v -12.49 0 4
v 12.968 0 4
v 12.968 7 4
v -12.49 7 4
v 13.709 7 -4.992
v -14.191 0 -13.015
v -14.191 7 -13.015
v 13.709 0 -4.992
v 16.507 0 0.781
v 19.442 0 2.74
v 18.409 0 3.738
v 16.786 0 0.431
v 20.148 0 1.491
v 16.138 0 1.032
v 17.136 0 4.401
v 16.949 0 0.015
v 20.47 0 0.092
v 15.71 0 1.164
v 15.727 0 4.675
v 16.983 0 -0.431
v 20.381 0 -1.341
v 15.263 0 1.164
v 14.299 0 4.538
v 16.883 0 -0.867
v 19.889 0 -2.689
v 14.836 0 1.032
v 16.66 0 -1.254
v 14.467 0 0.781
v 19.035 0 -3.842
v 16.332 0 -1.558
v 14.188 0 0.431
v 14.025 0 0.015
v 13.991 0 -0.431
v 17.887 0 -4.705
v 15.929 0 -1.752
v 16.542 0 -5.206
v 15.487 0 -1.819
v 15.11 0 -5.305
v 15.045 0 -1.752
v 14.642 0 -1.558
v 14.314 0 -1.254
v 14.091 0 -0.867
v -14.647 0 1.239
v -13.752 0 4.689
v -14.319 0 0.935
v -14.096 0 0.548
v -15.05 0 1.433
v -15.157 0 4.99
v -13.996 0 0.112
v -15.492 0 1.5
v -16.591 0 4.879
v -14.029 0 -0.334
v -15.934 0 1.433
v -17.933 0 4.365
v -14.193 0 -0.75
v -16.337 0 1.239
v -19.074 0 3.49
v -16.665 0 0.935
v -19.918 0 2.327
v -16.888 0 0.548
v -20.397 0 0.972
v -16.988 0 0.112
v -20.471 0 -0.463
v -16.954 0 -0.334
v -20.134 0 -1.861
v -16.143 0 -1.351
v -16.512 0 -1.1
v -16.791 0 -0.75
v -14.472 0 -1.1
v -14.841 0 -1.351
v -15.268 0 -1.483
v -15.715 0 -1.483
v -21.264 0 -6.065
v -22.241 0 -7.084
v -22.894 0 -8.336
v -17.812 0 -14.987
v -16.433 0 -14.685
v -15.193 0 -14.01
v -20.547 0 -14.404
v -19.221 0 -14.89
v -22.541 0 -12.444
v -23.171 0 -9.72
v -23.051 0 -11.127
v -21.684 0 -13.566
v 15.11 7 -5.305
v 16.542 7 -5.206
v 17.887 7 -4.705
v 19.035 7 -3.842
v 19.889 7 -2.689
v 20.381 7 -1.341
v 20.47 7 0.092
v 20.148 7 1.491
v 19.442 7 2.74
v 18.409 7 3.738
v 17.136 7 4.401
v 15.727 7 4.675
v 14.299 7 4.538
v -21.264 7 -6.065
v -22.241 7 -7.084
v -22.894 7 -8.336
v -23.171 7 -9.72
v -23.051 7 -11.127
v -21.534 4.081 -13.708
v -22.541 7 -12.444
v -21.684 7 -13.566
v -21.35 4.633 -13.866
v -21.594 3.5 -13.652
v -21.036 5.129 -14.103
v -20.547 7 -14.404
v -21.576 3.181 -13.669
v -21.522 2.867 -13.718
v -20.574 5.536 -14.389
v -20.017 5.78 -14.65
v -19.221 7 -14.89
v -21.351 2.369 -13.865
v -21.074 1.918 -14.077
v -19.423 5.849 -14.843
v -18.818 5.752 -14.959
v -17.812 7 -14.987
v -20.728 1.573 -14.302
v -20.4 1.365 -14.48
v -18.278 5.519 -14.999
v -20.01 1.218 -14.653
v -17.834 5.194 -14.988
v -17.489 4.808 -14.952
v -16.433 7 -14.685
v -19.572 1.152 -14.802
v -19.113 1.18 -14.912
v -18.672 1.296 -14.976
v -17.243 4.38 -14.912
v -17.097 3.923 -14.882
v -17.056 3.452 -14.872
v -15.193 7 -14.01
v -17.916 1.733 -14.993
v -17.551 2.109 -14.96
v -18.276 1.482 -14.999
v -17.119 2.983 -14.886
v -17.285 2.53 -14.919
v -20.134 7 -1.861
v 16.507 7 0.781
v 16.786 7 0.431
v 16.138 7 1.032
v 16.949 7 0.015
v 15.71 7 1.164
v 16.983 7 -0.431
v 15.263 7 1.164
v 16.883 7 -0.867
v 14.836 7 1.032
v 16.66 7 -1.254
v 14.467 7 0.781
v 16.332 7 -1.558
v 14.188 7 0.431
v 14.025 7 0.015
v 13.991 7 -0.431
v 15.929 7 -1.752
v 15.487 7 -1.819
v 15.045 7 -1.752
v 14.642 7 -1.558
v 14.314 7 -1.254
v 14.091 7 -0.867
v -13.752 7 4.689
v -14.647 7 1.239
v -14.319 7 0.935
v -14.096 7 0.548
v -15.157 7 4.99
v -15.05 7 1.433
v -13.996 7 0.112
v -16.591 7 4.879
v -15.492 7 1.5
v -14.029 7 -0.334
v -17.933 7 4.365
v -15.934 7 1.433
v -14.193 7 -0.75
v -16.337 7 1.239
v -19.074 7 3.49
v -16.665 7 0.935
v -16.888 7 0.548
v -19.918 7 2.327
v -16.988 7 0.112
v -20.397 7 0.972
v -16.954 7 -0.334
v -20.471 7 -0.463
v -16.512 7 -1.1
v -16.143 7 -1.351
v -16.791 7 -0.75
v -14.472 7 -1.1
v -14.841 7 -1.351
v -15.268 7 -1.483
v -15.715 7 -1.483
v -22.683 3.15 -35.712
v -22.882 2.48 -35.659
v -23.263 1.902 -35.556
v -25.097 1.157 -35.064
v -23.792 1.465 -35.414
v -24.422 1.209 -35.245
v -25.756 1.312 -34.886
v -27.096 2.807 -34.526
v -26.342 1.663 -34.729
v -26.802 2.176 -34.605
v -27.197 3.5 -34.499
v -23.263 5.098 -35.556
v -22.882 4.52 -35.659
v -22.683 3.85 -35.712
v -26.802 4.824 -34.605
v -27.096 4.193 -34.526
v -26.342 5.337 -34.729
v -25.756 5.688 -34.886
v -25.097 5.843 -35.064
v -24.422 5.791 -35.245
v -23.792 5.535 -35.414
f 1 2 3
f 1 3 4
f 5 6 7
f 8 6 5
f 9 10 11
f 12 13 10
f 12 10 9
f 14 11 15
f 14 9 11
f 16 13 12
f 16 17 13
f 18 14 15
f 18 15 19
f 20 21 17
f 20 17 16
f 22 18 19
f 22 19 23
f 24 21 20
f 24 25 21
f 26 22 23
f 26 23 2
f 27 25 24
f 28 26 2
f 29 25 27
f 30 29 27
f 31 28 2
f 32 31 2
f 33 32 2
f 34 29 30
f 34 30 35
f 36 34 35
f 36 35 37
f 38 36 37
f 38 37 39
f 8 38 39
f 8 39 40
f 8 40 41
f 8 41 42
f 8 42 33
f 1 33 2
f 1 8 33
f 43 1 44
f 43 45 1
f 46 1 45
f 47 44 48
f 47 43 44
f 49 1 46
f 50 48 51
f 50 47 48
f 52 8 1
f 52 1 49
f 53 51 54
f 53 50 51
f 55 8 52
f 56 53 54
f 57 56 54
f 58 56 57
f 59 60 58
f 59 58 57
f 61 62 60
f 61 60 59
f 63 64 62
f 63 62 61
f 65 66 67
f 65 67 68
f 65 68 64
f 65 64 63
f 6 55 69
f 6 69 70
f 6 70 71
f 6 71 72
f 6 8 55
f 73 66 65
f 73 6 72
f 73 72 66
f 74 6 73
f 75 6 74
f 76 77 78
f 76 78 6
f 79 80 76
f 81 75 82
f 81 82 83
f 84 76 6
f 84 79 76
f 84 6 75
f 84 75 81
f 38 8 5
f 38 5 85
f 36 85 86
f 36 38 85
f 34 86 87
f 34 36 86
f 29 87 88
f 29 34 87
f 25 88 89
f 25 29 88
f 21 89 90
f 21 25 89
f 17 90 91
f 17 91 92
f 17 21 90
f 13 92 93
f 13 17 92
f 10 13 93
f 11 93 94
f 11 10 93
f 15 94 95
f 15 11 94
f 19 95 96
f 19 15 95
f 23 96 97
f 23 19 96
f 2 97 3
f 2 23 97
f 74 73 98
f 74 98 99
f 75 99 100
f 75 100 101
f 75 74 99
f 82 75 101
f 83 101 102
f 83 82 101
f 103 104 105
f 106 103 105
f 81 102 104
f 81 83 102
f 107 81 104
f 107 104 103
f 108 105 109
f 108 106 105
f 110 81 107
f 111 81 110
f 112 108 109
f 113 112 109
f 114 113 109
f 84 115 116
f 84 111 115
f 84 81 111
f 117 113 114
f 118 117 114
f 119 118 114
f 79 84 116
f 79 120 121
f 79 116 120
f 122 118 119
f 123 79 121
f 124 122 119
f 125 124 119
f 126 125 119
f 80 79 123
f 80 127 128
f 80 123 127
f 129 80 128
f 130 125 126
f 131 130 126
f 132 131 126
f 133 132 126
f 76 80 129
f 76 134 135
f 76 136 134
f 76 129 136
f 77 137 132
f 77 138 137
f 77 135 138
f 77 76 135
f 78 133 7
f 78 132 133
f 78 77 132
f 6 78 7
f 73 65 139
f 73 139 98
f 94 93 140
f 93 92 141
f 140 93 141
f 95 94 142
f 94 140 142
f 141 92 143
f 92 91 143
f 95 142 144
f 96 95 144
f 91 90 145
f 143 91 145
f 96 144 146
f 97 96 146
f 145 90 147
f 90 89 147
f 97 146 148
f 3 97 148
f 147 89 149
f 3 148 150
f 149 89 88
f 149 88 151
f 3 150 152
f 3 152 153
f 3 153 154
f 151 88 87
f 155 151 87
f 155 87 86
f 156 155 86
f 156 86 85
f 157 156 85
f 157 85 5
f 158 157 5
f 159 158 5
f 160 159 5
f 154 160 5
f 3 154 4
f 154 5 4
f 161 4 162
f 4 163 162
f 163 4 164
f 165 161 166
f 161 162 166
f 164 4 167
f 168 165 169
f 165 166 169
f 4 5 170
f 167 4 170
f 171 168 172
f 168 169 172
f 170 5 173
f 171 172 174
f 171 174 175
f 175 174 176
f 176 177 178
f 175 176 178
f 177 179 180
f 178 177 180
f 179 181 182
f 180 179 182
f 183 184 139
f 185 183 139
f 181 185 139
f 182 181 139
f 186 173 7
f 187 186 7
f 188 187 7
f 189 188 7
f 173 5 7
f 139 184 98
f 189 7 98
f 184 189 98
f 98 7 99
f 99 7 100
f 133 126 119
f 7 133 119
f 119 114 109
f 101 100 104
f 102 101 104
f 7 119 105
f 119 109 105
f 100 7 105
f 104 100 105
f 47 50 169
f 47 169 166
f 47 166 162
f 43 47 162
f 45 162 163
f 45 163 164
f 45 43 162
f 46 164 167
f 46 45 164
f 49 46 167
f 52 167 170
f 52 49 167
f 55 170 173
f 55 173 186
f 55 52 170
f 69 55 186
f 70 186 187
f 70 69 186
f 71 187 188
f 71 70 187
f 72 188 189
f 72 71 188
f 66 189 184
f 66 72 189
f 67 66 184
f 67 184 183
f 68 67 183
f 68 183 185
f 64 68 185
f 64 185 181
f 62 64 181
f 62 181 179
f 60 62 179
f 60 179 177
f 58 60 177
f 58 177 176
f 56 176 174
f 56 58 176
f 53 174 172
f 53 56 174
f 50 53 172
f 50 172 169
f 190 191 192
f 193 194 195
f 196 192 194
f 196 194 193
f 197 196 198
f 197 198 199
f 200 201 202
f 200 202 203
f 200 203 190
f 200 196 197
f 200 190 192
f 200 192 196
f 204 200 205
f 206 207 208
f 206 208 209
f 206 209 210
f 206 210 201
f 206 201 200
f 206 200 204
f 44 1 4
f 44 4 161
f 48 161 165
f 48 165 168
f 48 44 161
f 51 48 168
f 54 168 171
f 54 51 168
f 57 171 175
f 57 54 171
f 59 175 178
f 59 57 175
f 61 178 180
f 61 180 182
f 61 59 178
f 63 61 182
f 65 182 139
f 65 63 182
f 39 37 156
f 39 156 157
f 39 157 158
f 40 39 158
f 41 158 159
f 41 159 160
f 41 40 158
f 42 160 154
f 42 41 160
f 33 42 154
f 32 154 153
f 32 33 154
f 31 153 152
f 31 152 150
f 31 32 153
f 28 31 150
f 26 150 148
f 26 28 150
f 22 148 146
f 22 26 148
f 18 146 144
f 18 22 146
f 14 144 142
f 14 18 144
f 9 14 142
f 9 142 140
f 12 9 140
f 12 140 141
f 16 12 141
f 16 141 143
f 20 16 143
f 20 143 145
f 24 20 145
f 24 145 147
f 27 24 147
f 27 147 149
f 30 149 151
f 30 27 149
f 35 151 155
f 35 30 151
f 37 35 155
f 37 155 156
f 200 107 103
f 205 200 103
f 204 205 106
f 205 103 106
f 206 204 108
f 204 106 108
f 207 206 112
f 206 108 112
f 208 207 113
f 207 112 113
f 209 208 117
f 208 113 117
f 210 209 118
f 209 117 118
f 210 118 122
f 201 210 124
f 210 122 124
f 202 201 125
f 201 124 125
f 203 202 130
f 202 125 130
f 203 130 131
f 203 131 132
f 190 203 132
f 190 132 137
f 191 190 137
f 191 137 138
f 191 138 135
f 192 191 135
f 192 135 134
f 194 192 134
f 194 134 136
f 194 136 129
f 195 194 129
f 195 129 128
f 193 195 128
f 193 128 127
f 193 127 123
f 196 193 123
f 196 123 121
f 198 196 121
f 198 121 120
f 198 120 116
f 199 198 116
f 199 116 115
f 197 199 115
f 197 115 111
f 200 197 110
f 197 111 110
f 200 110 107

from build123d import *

# Parameters (mm, degrees)
CROQUIS1_R                   = 1.5
SALIENTE_EXTRUIR1_DEPTH      = 7
SALIENTE_EXTRUIR3_DEPTH      = 21
SALIENTE_EXTRUIR3_DEPTH_BACK = 3
CROQUIS3_R                   = 2.35


with BuildPart() as part:
    # Croquis1 → Saliente-Extruir1 (new body)
    with BuildSketch(Plane(origin=(0, 0, 0), x_dir=(1, 0, 0), z_dir=(0, 1, 0))):
        with BuildLine():
            Line((12.967669222, -4), (-12.4902, -4))
            ThreePointArc((-12.4902, -4), (-18.53478474, -3.968671916), (-20.133802427, 1.860661543))
            Line((-20.133802427, 1.860661543), (-21.263589404, 6.064668523))
            ThreePointArc((-21.263589404, 6.064668523), (-21.68376794, 13.566277491), (-14.19064257, 13.015133868))
            Line((-14.19064257, 13.015133868), (13.709196644, 4.992255837))
            ThreePointArc((13.709196644, 4.992255837), (20.470001725, -0.091961868), (12.967669222, -4))
        make_face()
        with Locations(Location((-15.491842215, 0, 0), (0, 0, 270))):
            Circle(CROQUIS1_R, mode=Mode.SUBTRACT)
        with Locations(Location((15.486915831, 0.318957805, 0), (0, 0, 90))):
            Circle(CROQUIS1_R, mode=Mode.SUBTRACT)
    extrude(amount=SALIENTE_EXTRUIR1_DEPTH)

    # Croquis3 → Saliente-Extruir3 (add, two sides: drawn at the far end of the back side and taken through both)
    with BuildSketch(Plane(origin=(-5.028546726, 0, -18.711532324), x_dir=(-0.9657345126344663, 0, 0.25953198474690947), z_dir=(-0.2595319847469094, 0, -0.9657345126344662)).offset(-SALIENTE_EXTRUIR3_DEPTH_BACK)):
        with Locations((14.961006691, 3.5)):
            Circle(CROQUIS3_R)
    extrude(amount=SALIENTE_EXTRUIR3_DEPTH + SALIENTE_EXTRUIR3_DEPTH_BACK)


solid = part.part
